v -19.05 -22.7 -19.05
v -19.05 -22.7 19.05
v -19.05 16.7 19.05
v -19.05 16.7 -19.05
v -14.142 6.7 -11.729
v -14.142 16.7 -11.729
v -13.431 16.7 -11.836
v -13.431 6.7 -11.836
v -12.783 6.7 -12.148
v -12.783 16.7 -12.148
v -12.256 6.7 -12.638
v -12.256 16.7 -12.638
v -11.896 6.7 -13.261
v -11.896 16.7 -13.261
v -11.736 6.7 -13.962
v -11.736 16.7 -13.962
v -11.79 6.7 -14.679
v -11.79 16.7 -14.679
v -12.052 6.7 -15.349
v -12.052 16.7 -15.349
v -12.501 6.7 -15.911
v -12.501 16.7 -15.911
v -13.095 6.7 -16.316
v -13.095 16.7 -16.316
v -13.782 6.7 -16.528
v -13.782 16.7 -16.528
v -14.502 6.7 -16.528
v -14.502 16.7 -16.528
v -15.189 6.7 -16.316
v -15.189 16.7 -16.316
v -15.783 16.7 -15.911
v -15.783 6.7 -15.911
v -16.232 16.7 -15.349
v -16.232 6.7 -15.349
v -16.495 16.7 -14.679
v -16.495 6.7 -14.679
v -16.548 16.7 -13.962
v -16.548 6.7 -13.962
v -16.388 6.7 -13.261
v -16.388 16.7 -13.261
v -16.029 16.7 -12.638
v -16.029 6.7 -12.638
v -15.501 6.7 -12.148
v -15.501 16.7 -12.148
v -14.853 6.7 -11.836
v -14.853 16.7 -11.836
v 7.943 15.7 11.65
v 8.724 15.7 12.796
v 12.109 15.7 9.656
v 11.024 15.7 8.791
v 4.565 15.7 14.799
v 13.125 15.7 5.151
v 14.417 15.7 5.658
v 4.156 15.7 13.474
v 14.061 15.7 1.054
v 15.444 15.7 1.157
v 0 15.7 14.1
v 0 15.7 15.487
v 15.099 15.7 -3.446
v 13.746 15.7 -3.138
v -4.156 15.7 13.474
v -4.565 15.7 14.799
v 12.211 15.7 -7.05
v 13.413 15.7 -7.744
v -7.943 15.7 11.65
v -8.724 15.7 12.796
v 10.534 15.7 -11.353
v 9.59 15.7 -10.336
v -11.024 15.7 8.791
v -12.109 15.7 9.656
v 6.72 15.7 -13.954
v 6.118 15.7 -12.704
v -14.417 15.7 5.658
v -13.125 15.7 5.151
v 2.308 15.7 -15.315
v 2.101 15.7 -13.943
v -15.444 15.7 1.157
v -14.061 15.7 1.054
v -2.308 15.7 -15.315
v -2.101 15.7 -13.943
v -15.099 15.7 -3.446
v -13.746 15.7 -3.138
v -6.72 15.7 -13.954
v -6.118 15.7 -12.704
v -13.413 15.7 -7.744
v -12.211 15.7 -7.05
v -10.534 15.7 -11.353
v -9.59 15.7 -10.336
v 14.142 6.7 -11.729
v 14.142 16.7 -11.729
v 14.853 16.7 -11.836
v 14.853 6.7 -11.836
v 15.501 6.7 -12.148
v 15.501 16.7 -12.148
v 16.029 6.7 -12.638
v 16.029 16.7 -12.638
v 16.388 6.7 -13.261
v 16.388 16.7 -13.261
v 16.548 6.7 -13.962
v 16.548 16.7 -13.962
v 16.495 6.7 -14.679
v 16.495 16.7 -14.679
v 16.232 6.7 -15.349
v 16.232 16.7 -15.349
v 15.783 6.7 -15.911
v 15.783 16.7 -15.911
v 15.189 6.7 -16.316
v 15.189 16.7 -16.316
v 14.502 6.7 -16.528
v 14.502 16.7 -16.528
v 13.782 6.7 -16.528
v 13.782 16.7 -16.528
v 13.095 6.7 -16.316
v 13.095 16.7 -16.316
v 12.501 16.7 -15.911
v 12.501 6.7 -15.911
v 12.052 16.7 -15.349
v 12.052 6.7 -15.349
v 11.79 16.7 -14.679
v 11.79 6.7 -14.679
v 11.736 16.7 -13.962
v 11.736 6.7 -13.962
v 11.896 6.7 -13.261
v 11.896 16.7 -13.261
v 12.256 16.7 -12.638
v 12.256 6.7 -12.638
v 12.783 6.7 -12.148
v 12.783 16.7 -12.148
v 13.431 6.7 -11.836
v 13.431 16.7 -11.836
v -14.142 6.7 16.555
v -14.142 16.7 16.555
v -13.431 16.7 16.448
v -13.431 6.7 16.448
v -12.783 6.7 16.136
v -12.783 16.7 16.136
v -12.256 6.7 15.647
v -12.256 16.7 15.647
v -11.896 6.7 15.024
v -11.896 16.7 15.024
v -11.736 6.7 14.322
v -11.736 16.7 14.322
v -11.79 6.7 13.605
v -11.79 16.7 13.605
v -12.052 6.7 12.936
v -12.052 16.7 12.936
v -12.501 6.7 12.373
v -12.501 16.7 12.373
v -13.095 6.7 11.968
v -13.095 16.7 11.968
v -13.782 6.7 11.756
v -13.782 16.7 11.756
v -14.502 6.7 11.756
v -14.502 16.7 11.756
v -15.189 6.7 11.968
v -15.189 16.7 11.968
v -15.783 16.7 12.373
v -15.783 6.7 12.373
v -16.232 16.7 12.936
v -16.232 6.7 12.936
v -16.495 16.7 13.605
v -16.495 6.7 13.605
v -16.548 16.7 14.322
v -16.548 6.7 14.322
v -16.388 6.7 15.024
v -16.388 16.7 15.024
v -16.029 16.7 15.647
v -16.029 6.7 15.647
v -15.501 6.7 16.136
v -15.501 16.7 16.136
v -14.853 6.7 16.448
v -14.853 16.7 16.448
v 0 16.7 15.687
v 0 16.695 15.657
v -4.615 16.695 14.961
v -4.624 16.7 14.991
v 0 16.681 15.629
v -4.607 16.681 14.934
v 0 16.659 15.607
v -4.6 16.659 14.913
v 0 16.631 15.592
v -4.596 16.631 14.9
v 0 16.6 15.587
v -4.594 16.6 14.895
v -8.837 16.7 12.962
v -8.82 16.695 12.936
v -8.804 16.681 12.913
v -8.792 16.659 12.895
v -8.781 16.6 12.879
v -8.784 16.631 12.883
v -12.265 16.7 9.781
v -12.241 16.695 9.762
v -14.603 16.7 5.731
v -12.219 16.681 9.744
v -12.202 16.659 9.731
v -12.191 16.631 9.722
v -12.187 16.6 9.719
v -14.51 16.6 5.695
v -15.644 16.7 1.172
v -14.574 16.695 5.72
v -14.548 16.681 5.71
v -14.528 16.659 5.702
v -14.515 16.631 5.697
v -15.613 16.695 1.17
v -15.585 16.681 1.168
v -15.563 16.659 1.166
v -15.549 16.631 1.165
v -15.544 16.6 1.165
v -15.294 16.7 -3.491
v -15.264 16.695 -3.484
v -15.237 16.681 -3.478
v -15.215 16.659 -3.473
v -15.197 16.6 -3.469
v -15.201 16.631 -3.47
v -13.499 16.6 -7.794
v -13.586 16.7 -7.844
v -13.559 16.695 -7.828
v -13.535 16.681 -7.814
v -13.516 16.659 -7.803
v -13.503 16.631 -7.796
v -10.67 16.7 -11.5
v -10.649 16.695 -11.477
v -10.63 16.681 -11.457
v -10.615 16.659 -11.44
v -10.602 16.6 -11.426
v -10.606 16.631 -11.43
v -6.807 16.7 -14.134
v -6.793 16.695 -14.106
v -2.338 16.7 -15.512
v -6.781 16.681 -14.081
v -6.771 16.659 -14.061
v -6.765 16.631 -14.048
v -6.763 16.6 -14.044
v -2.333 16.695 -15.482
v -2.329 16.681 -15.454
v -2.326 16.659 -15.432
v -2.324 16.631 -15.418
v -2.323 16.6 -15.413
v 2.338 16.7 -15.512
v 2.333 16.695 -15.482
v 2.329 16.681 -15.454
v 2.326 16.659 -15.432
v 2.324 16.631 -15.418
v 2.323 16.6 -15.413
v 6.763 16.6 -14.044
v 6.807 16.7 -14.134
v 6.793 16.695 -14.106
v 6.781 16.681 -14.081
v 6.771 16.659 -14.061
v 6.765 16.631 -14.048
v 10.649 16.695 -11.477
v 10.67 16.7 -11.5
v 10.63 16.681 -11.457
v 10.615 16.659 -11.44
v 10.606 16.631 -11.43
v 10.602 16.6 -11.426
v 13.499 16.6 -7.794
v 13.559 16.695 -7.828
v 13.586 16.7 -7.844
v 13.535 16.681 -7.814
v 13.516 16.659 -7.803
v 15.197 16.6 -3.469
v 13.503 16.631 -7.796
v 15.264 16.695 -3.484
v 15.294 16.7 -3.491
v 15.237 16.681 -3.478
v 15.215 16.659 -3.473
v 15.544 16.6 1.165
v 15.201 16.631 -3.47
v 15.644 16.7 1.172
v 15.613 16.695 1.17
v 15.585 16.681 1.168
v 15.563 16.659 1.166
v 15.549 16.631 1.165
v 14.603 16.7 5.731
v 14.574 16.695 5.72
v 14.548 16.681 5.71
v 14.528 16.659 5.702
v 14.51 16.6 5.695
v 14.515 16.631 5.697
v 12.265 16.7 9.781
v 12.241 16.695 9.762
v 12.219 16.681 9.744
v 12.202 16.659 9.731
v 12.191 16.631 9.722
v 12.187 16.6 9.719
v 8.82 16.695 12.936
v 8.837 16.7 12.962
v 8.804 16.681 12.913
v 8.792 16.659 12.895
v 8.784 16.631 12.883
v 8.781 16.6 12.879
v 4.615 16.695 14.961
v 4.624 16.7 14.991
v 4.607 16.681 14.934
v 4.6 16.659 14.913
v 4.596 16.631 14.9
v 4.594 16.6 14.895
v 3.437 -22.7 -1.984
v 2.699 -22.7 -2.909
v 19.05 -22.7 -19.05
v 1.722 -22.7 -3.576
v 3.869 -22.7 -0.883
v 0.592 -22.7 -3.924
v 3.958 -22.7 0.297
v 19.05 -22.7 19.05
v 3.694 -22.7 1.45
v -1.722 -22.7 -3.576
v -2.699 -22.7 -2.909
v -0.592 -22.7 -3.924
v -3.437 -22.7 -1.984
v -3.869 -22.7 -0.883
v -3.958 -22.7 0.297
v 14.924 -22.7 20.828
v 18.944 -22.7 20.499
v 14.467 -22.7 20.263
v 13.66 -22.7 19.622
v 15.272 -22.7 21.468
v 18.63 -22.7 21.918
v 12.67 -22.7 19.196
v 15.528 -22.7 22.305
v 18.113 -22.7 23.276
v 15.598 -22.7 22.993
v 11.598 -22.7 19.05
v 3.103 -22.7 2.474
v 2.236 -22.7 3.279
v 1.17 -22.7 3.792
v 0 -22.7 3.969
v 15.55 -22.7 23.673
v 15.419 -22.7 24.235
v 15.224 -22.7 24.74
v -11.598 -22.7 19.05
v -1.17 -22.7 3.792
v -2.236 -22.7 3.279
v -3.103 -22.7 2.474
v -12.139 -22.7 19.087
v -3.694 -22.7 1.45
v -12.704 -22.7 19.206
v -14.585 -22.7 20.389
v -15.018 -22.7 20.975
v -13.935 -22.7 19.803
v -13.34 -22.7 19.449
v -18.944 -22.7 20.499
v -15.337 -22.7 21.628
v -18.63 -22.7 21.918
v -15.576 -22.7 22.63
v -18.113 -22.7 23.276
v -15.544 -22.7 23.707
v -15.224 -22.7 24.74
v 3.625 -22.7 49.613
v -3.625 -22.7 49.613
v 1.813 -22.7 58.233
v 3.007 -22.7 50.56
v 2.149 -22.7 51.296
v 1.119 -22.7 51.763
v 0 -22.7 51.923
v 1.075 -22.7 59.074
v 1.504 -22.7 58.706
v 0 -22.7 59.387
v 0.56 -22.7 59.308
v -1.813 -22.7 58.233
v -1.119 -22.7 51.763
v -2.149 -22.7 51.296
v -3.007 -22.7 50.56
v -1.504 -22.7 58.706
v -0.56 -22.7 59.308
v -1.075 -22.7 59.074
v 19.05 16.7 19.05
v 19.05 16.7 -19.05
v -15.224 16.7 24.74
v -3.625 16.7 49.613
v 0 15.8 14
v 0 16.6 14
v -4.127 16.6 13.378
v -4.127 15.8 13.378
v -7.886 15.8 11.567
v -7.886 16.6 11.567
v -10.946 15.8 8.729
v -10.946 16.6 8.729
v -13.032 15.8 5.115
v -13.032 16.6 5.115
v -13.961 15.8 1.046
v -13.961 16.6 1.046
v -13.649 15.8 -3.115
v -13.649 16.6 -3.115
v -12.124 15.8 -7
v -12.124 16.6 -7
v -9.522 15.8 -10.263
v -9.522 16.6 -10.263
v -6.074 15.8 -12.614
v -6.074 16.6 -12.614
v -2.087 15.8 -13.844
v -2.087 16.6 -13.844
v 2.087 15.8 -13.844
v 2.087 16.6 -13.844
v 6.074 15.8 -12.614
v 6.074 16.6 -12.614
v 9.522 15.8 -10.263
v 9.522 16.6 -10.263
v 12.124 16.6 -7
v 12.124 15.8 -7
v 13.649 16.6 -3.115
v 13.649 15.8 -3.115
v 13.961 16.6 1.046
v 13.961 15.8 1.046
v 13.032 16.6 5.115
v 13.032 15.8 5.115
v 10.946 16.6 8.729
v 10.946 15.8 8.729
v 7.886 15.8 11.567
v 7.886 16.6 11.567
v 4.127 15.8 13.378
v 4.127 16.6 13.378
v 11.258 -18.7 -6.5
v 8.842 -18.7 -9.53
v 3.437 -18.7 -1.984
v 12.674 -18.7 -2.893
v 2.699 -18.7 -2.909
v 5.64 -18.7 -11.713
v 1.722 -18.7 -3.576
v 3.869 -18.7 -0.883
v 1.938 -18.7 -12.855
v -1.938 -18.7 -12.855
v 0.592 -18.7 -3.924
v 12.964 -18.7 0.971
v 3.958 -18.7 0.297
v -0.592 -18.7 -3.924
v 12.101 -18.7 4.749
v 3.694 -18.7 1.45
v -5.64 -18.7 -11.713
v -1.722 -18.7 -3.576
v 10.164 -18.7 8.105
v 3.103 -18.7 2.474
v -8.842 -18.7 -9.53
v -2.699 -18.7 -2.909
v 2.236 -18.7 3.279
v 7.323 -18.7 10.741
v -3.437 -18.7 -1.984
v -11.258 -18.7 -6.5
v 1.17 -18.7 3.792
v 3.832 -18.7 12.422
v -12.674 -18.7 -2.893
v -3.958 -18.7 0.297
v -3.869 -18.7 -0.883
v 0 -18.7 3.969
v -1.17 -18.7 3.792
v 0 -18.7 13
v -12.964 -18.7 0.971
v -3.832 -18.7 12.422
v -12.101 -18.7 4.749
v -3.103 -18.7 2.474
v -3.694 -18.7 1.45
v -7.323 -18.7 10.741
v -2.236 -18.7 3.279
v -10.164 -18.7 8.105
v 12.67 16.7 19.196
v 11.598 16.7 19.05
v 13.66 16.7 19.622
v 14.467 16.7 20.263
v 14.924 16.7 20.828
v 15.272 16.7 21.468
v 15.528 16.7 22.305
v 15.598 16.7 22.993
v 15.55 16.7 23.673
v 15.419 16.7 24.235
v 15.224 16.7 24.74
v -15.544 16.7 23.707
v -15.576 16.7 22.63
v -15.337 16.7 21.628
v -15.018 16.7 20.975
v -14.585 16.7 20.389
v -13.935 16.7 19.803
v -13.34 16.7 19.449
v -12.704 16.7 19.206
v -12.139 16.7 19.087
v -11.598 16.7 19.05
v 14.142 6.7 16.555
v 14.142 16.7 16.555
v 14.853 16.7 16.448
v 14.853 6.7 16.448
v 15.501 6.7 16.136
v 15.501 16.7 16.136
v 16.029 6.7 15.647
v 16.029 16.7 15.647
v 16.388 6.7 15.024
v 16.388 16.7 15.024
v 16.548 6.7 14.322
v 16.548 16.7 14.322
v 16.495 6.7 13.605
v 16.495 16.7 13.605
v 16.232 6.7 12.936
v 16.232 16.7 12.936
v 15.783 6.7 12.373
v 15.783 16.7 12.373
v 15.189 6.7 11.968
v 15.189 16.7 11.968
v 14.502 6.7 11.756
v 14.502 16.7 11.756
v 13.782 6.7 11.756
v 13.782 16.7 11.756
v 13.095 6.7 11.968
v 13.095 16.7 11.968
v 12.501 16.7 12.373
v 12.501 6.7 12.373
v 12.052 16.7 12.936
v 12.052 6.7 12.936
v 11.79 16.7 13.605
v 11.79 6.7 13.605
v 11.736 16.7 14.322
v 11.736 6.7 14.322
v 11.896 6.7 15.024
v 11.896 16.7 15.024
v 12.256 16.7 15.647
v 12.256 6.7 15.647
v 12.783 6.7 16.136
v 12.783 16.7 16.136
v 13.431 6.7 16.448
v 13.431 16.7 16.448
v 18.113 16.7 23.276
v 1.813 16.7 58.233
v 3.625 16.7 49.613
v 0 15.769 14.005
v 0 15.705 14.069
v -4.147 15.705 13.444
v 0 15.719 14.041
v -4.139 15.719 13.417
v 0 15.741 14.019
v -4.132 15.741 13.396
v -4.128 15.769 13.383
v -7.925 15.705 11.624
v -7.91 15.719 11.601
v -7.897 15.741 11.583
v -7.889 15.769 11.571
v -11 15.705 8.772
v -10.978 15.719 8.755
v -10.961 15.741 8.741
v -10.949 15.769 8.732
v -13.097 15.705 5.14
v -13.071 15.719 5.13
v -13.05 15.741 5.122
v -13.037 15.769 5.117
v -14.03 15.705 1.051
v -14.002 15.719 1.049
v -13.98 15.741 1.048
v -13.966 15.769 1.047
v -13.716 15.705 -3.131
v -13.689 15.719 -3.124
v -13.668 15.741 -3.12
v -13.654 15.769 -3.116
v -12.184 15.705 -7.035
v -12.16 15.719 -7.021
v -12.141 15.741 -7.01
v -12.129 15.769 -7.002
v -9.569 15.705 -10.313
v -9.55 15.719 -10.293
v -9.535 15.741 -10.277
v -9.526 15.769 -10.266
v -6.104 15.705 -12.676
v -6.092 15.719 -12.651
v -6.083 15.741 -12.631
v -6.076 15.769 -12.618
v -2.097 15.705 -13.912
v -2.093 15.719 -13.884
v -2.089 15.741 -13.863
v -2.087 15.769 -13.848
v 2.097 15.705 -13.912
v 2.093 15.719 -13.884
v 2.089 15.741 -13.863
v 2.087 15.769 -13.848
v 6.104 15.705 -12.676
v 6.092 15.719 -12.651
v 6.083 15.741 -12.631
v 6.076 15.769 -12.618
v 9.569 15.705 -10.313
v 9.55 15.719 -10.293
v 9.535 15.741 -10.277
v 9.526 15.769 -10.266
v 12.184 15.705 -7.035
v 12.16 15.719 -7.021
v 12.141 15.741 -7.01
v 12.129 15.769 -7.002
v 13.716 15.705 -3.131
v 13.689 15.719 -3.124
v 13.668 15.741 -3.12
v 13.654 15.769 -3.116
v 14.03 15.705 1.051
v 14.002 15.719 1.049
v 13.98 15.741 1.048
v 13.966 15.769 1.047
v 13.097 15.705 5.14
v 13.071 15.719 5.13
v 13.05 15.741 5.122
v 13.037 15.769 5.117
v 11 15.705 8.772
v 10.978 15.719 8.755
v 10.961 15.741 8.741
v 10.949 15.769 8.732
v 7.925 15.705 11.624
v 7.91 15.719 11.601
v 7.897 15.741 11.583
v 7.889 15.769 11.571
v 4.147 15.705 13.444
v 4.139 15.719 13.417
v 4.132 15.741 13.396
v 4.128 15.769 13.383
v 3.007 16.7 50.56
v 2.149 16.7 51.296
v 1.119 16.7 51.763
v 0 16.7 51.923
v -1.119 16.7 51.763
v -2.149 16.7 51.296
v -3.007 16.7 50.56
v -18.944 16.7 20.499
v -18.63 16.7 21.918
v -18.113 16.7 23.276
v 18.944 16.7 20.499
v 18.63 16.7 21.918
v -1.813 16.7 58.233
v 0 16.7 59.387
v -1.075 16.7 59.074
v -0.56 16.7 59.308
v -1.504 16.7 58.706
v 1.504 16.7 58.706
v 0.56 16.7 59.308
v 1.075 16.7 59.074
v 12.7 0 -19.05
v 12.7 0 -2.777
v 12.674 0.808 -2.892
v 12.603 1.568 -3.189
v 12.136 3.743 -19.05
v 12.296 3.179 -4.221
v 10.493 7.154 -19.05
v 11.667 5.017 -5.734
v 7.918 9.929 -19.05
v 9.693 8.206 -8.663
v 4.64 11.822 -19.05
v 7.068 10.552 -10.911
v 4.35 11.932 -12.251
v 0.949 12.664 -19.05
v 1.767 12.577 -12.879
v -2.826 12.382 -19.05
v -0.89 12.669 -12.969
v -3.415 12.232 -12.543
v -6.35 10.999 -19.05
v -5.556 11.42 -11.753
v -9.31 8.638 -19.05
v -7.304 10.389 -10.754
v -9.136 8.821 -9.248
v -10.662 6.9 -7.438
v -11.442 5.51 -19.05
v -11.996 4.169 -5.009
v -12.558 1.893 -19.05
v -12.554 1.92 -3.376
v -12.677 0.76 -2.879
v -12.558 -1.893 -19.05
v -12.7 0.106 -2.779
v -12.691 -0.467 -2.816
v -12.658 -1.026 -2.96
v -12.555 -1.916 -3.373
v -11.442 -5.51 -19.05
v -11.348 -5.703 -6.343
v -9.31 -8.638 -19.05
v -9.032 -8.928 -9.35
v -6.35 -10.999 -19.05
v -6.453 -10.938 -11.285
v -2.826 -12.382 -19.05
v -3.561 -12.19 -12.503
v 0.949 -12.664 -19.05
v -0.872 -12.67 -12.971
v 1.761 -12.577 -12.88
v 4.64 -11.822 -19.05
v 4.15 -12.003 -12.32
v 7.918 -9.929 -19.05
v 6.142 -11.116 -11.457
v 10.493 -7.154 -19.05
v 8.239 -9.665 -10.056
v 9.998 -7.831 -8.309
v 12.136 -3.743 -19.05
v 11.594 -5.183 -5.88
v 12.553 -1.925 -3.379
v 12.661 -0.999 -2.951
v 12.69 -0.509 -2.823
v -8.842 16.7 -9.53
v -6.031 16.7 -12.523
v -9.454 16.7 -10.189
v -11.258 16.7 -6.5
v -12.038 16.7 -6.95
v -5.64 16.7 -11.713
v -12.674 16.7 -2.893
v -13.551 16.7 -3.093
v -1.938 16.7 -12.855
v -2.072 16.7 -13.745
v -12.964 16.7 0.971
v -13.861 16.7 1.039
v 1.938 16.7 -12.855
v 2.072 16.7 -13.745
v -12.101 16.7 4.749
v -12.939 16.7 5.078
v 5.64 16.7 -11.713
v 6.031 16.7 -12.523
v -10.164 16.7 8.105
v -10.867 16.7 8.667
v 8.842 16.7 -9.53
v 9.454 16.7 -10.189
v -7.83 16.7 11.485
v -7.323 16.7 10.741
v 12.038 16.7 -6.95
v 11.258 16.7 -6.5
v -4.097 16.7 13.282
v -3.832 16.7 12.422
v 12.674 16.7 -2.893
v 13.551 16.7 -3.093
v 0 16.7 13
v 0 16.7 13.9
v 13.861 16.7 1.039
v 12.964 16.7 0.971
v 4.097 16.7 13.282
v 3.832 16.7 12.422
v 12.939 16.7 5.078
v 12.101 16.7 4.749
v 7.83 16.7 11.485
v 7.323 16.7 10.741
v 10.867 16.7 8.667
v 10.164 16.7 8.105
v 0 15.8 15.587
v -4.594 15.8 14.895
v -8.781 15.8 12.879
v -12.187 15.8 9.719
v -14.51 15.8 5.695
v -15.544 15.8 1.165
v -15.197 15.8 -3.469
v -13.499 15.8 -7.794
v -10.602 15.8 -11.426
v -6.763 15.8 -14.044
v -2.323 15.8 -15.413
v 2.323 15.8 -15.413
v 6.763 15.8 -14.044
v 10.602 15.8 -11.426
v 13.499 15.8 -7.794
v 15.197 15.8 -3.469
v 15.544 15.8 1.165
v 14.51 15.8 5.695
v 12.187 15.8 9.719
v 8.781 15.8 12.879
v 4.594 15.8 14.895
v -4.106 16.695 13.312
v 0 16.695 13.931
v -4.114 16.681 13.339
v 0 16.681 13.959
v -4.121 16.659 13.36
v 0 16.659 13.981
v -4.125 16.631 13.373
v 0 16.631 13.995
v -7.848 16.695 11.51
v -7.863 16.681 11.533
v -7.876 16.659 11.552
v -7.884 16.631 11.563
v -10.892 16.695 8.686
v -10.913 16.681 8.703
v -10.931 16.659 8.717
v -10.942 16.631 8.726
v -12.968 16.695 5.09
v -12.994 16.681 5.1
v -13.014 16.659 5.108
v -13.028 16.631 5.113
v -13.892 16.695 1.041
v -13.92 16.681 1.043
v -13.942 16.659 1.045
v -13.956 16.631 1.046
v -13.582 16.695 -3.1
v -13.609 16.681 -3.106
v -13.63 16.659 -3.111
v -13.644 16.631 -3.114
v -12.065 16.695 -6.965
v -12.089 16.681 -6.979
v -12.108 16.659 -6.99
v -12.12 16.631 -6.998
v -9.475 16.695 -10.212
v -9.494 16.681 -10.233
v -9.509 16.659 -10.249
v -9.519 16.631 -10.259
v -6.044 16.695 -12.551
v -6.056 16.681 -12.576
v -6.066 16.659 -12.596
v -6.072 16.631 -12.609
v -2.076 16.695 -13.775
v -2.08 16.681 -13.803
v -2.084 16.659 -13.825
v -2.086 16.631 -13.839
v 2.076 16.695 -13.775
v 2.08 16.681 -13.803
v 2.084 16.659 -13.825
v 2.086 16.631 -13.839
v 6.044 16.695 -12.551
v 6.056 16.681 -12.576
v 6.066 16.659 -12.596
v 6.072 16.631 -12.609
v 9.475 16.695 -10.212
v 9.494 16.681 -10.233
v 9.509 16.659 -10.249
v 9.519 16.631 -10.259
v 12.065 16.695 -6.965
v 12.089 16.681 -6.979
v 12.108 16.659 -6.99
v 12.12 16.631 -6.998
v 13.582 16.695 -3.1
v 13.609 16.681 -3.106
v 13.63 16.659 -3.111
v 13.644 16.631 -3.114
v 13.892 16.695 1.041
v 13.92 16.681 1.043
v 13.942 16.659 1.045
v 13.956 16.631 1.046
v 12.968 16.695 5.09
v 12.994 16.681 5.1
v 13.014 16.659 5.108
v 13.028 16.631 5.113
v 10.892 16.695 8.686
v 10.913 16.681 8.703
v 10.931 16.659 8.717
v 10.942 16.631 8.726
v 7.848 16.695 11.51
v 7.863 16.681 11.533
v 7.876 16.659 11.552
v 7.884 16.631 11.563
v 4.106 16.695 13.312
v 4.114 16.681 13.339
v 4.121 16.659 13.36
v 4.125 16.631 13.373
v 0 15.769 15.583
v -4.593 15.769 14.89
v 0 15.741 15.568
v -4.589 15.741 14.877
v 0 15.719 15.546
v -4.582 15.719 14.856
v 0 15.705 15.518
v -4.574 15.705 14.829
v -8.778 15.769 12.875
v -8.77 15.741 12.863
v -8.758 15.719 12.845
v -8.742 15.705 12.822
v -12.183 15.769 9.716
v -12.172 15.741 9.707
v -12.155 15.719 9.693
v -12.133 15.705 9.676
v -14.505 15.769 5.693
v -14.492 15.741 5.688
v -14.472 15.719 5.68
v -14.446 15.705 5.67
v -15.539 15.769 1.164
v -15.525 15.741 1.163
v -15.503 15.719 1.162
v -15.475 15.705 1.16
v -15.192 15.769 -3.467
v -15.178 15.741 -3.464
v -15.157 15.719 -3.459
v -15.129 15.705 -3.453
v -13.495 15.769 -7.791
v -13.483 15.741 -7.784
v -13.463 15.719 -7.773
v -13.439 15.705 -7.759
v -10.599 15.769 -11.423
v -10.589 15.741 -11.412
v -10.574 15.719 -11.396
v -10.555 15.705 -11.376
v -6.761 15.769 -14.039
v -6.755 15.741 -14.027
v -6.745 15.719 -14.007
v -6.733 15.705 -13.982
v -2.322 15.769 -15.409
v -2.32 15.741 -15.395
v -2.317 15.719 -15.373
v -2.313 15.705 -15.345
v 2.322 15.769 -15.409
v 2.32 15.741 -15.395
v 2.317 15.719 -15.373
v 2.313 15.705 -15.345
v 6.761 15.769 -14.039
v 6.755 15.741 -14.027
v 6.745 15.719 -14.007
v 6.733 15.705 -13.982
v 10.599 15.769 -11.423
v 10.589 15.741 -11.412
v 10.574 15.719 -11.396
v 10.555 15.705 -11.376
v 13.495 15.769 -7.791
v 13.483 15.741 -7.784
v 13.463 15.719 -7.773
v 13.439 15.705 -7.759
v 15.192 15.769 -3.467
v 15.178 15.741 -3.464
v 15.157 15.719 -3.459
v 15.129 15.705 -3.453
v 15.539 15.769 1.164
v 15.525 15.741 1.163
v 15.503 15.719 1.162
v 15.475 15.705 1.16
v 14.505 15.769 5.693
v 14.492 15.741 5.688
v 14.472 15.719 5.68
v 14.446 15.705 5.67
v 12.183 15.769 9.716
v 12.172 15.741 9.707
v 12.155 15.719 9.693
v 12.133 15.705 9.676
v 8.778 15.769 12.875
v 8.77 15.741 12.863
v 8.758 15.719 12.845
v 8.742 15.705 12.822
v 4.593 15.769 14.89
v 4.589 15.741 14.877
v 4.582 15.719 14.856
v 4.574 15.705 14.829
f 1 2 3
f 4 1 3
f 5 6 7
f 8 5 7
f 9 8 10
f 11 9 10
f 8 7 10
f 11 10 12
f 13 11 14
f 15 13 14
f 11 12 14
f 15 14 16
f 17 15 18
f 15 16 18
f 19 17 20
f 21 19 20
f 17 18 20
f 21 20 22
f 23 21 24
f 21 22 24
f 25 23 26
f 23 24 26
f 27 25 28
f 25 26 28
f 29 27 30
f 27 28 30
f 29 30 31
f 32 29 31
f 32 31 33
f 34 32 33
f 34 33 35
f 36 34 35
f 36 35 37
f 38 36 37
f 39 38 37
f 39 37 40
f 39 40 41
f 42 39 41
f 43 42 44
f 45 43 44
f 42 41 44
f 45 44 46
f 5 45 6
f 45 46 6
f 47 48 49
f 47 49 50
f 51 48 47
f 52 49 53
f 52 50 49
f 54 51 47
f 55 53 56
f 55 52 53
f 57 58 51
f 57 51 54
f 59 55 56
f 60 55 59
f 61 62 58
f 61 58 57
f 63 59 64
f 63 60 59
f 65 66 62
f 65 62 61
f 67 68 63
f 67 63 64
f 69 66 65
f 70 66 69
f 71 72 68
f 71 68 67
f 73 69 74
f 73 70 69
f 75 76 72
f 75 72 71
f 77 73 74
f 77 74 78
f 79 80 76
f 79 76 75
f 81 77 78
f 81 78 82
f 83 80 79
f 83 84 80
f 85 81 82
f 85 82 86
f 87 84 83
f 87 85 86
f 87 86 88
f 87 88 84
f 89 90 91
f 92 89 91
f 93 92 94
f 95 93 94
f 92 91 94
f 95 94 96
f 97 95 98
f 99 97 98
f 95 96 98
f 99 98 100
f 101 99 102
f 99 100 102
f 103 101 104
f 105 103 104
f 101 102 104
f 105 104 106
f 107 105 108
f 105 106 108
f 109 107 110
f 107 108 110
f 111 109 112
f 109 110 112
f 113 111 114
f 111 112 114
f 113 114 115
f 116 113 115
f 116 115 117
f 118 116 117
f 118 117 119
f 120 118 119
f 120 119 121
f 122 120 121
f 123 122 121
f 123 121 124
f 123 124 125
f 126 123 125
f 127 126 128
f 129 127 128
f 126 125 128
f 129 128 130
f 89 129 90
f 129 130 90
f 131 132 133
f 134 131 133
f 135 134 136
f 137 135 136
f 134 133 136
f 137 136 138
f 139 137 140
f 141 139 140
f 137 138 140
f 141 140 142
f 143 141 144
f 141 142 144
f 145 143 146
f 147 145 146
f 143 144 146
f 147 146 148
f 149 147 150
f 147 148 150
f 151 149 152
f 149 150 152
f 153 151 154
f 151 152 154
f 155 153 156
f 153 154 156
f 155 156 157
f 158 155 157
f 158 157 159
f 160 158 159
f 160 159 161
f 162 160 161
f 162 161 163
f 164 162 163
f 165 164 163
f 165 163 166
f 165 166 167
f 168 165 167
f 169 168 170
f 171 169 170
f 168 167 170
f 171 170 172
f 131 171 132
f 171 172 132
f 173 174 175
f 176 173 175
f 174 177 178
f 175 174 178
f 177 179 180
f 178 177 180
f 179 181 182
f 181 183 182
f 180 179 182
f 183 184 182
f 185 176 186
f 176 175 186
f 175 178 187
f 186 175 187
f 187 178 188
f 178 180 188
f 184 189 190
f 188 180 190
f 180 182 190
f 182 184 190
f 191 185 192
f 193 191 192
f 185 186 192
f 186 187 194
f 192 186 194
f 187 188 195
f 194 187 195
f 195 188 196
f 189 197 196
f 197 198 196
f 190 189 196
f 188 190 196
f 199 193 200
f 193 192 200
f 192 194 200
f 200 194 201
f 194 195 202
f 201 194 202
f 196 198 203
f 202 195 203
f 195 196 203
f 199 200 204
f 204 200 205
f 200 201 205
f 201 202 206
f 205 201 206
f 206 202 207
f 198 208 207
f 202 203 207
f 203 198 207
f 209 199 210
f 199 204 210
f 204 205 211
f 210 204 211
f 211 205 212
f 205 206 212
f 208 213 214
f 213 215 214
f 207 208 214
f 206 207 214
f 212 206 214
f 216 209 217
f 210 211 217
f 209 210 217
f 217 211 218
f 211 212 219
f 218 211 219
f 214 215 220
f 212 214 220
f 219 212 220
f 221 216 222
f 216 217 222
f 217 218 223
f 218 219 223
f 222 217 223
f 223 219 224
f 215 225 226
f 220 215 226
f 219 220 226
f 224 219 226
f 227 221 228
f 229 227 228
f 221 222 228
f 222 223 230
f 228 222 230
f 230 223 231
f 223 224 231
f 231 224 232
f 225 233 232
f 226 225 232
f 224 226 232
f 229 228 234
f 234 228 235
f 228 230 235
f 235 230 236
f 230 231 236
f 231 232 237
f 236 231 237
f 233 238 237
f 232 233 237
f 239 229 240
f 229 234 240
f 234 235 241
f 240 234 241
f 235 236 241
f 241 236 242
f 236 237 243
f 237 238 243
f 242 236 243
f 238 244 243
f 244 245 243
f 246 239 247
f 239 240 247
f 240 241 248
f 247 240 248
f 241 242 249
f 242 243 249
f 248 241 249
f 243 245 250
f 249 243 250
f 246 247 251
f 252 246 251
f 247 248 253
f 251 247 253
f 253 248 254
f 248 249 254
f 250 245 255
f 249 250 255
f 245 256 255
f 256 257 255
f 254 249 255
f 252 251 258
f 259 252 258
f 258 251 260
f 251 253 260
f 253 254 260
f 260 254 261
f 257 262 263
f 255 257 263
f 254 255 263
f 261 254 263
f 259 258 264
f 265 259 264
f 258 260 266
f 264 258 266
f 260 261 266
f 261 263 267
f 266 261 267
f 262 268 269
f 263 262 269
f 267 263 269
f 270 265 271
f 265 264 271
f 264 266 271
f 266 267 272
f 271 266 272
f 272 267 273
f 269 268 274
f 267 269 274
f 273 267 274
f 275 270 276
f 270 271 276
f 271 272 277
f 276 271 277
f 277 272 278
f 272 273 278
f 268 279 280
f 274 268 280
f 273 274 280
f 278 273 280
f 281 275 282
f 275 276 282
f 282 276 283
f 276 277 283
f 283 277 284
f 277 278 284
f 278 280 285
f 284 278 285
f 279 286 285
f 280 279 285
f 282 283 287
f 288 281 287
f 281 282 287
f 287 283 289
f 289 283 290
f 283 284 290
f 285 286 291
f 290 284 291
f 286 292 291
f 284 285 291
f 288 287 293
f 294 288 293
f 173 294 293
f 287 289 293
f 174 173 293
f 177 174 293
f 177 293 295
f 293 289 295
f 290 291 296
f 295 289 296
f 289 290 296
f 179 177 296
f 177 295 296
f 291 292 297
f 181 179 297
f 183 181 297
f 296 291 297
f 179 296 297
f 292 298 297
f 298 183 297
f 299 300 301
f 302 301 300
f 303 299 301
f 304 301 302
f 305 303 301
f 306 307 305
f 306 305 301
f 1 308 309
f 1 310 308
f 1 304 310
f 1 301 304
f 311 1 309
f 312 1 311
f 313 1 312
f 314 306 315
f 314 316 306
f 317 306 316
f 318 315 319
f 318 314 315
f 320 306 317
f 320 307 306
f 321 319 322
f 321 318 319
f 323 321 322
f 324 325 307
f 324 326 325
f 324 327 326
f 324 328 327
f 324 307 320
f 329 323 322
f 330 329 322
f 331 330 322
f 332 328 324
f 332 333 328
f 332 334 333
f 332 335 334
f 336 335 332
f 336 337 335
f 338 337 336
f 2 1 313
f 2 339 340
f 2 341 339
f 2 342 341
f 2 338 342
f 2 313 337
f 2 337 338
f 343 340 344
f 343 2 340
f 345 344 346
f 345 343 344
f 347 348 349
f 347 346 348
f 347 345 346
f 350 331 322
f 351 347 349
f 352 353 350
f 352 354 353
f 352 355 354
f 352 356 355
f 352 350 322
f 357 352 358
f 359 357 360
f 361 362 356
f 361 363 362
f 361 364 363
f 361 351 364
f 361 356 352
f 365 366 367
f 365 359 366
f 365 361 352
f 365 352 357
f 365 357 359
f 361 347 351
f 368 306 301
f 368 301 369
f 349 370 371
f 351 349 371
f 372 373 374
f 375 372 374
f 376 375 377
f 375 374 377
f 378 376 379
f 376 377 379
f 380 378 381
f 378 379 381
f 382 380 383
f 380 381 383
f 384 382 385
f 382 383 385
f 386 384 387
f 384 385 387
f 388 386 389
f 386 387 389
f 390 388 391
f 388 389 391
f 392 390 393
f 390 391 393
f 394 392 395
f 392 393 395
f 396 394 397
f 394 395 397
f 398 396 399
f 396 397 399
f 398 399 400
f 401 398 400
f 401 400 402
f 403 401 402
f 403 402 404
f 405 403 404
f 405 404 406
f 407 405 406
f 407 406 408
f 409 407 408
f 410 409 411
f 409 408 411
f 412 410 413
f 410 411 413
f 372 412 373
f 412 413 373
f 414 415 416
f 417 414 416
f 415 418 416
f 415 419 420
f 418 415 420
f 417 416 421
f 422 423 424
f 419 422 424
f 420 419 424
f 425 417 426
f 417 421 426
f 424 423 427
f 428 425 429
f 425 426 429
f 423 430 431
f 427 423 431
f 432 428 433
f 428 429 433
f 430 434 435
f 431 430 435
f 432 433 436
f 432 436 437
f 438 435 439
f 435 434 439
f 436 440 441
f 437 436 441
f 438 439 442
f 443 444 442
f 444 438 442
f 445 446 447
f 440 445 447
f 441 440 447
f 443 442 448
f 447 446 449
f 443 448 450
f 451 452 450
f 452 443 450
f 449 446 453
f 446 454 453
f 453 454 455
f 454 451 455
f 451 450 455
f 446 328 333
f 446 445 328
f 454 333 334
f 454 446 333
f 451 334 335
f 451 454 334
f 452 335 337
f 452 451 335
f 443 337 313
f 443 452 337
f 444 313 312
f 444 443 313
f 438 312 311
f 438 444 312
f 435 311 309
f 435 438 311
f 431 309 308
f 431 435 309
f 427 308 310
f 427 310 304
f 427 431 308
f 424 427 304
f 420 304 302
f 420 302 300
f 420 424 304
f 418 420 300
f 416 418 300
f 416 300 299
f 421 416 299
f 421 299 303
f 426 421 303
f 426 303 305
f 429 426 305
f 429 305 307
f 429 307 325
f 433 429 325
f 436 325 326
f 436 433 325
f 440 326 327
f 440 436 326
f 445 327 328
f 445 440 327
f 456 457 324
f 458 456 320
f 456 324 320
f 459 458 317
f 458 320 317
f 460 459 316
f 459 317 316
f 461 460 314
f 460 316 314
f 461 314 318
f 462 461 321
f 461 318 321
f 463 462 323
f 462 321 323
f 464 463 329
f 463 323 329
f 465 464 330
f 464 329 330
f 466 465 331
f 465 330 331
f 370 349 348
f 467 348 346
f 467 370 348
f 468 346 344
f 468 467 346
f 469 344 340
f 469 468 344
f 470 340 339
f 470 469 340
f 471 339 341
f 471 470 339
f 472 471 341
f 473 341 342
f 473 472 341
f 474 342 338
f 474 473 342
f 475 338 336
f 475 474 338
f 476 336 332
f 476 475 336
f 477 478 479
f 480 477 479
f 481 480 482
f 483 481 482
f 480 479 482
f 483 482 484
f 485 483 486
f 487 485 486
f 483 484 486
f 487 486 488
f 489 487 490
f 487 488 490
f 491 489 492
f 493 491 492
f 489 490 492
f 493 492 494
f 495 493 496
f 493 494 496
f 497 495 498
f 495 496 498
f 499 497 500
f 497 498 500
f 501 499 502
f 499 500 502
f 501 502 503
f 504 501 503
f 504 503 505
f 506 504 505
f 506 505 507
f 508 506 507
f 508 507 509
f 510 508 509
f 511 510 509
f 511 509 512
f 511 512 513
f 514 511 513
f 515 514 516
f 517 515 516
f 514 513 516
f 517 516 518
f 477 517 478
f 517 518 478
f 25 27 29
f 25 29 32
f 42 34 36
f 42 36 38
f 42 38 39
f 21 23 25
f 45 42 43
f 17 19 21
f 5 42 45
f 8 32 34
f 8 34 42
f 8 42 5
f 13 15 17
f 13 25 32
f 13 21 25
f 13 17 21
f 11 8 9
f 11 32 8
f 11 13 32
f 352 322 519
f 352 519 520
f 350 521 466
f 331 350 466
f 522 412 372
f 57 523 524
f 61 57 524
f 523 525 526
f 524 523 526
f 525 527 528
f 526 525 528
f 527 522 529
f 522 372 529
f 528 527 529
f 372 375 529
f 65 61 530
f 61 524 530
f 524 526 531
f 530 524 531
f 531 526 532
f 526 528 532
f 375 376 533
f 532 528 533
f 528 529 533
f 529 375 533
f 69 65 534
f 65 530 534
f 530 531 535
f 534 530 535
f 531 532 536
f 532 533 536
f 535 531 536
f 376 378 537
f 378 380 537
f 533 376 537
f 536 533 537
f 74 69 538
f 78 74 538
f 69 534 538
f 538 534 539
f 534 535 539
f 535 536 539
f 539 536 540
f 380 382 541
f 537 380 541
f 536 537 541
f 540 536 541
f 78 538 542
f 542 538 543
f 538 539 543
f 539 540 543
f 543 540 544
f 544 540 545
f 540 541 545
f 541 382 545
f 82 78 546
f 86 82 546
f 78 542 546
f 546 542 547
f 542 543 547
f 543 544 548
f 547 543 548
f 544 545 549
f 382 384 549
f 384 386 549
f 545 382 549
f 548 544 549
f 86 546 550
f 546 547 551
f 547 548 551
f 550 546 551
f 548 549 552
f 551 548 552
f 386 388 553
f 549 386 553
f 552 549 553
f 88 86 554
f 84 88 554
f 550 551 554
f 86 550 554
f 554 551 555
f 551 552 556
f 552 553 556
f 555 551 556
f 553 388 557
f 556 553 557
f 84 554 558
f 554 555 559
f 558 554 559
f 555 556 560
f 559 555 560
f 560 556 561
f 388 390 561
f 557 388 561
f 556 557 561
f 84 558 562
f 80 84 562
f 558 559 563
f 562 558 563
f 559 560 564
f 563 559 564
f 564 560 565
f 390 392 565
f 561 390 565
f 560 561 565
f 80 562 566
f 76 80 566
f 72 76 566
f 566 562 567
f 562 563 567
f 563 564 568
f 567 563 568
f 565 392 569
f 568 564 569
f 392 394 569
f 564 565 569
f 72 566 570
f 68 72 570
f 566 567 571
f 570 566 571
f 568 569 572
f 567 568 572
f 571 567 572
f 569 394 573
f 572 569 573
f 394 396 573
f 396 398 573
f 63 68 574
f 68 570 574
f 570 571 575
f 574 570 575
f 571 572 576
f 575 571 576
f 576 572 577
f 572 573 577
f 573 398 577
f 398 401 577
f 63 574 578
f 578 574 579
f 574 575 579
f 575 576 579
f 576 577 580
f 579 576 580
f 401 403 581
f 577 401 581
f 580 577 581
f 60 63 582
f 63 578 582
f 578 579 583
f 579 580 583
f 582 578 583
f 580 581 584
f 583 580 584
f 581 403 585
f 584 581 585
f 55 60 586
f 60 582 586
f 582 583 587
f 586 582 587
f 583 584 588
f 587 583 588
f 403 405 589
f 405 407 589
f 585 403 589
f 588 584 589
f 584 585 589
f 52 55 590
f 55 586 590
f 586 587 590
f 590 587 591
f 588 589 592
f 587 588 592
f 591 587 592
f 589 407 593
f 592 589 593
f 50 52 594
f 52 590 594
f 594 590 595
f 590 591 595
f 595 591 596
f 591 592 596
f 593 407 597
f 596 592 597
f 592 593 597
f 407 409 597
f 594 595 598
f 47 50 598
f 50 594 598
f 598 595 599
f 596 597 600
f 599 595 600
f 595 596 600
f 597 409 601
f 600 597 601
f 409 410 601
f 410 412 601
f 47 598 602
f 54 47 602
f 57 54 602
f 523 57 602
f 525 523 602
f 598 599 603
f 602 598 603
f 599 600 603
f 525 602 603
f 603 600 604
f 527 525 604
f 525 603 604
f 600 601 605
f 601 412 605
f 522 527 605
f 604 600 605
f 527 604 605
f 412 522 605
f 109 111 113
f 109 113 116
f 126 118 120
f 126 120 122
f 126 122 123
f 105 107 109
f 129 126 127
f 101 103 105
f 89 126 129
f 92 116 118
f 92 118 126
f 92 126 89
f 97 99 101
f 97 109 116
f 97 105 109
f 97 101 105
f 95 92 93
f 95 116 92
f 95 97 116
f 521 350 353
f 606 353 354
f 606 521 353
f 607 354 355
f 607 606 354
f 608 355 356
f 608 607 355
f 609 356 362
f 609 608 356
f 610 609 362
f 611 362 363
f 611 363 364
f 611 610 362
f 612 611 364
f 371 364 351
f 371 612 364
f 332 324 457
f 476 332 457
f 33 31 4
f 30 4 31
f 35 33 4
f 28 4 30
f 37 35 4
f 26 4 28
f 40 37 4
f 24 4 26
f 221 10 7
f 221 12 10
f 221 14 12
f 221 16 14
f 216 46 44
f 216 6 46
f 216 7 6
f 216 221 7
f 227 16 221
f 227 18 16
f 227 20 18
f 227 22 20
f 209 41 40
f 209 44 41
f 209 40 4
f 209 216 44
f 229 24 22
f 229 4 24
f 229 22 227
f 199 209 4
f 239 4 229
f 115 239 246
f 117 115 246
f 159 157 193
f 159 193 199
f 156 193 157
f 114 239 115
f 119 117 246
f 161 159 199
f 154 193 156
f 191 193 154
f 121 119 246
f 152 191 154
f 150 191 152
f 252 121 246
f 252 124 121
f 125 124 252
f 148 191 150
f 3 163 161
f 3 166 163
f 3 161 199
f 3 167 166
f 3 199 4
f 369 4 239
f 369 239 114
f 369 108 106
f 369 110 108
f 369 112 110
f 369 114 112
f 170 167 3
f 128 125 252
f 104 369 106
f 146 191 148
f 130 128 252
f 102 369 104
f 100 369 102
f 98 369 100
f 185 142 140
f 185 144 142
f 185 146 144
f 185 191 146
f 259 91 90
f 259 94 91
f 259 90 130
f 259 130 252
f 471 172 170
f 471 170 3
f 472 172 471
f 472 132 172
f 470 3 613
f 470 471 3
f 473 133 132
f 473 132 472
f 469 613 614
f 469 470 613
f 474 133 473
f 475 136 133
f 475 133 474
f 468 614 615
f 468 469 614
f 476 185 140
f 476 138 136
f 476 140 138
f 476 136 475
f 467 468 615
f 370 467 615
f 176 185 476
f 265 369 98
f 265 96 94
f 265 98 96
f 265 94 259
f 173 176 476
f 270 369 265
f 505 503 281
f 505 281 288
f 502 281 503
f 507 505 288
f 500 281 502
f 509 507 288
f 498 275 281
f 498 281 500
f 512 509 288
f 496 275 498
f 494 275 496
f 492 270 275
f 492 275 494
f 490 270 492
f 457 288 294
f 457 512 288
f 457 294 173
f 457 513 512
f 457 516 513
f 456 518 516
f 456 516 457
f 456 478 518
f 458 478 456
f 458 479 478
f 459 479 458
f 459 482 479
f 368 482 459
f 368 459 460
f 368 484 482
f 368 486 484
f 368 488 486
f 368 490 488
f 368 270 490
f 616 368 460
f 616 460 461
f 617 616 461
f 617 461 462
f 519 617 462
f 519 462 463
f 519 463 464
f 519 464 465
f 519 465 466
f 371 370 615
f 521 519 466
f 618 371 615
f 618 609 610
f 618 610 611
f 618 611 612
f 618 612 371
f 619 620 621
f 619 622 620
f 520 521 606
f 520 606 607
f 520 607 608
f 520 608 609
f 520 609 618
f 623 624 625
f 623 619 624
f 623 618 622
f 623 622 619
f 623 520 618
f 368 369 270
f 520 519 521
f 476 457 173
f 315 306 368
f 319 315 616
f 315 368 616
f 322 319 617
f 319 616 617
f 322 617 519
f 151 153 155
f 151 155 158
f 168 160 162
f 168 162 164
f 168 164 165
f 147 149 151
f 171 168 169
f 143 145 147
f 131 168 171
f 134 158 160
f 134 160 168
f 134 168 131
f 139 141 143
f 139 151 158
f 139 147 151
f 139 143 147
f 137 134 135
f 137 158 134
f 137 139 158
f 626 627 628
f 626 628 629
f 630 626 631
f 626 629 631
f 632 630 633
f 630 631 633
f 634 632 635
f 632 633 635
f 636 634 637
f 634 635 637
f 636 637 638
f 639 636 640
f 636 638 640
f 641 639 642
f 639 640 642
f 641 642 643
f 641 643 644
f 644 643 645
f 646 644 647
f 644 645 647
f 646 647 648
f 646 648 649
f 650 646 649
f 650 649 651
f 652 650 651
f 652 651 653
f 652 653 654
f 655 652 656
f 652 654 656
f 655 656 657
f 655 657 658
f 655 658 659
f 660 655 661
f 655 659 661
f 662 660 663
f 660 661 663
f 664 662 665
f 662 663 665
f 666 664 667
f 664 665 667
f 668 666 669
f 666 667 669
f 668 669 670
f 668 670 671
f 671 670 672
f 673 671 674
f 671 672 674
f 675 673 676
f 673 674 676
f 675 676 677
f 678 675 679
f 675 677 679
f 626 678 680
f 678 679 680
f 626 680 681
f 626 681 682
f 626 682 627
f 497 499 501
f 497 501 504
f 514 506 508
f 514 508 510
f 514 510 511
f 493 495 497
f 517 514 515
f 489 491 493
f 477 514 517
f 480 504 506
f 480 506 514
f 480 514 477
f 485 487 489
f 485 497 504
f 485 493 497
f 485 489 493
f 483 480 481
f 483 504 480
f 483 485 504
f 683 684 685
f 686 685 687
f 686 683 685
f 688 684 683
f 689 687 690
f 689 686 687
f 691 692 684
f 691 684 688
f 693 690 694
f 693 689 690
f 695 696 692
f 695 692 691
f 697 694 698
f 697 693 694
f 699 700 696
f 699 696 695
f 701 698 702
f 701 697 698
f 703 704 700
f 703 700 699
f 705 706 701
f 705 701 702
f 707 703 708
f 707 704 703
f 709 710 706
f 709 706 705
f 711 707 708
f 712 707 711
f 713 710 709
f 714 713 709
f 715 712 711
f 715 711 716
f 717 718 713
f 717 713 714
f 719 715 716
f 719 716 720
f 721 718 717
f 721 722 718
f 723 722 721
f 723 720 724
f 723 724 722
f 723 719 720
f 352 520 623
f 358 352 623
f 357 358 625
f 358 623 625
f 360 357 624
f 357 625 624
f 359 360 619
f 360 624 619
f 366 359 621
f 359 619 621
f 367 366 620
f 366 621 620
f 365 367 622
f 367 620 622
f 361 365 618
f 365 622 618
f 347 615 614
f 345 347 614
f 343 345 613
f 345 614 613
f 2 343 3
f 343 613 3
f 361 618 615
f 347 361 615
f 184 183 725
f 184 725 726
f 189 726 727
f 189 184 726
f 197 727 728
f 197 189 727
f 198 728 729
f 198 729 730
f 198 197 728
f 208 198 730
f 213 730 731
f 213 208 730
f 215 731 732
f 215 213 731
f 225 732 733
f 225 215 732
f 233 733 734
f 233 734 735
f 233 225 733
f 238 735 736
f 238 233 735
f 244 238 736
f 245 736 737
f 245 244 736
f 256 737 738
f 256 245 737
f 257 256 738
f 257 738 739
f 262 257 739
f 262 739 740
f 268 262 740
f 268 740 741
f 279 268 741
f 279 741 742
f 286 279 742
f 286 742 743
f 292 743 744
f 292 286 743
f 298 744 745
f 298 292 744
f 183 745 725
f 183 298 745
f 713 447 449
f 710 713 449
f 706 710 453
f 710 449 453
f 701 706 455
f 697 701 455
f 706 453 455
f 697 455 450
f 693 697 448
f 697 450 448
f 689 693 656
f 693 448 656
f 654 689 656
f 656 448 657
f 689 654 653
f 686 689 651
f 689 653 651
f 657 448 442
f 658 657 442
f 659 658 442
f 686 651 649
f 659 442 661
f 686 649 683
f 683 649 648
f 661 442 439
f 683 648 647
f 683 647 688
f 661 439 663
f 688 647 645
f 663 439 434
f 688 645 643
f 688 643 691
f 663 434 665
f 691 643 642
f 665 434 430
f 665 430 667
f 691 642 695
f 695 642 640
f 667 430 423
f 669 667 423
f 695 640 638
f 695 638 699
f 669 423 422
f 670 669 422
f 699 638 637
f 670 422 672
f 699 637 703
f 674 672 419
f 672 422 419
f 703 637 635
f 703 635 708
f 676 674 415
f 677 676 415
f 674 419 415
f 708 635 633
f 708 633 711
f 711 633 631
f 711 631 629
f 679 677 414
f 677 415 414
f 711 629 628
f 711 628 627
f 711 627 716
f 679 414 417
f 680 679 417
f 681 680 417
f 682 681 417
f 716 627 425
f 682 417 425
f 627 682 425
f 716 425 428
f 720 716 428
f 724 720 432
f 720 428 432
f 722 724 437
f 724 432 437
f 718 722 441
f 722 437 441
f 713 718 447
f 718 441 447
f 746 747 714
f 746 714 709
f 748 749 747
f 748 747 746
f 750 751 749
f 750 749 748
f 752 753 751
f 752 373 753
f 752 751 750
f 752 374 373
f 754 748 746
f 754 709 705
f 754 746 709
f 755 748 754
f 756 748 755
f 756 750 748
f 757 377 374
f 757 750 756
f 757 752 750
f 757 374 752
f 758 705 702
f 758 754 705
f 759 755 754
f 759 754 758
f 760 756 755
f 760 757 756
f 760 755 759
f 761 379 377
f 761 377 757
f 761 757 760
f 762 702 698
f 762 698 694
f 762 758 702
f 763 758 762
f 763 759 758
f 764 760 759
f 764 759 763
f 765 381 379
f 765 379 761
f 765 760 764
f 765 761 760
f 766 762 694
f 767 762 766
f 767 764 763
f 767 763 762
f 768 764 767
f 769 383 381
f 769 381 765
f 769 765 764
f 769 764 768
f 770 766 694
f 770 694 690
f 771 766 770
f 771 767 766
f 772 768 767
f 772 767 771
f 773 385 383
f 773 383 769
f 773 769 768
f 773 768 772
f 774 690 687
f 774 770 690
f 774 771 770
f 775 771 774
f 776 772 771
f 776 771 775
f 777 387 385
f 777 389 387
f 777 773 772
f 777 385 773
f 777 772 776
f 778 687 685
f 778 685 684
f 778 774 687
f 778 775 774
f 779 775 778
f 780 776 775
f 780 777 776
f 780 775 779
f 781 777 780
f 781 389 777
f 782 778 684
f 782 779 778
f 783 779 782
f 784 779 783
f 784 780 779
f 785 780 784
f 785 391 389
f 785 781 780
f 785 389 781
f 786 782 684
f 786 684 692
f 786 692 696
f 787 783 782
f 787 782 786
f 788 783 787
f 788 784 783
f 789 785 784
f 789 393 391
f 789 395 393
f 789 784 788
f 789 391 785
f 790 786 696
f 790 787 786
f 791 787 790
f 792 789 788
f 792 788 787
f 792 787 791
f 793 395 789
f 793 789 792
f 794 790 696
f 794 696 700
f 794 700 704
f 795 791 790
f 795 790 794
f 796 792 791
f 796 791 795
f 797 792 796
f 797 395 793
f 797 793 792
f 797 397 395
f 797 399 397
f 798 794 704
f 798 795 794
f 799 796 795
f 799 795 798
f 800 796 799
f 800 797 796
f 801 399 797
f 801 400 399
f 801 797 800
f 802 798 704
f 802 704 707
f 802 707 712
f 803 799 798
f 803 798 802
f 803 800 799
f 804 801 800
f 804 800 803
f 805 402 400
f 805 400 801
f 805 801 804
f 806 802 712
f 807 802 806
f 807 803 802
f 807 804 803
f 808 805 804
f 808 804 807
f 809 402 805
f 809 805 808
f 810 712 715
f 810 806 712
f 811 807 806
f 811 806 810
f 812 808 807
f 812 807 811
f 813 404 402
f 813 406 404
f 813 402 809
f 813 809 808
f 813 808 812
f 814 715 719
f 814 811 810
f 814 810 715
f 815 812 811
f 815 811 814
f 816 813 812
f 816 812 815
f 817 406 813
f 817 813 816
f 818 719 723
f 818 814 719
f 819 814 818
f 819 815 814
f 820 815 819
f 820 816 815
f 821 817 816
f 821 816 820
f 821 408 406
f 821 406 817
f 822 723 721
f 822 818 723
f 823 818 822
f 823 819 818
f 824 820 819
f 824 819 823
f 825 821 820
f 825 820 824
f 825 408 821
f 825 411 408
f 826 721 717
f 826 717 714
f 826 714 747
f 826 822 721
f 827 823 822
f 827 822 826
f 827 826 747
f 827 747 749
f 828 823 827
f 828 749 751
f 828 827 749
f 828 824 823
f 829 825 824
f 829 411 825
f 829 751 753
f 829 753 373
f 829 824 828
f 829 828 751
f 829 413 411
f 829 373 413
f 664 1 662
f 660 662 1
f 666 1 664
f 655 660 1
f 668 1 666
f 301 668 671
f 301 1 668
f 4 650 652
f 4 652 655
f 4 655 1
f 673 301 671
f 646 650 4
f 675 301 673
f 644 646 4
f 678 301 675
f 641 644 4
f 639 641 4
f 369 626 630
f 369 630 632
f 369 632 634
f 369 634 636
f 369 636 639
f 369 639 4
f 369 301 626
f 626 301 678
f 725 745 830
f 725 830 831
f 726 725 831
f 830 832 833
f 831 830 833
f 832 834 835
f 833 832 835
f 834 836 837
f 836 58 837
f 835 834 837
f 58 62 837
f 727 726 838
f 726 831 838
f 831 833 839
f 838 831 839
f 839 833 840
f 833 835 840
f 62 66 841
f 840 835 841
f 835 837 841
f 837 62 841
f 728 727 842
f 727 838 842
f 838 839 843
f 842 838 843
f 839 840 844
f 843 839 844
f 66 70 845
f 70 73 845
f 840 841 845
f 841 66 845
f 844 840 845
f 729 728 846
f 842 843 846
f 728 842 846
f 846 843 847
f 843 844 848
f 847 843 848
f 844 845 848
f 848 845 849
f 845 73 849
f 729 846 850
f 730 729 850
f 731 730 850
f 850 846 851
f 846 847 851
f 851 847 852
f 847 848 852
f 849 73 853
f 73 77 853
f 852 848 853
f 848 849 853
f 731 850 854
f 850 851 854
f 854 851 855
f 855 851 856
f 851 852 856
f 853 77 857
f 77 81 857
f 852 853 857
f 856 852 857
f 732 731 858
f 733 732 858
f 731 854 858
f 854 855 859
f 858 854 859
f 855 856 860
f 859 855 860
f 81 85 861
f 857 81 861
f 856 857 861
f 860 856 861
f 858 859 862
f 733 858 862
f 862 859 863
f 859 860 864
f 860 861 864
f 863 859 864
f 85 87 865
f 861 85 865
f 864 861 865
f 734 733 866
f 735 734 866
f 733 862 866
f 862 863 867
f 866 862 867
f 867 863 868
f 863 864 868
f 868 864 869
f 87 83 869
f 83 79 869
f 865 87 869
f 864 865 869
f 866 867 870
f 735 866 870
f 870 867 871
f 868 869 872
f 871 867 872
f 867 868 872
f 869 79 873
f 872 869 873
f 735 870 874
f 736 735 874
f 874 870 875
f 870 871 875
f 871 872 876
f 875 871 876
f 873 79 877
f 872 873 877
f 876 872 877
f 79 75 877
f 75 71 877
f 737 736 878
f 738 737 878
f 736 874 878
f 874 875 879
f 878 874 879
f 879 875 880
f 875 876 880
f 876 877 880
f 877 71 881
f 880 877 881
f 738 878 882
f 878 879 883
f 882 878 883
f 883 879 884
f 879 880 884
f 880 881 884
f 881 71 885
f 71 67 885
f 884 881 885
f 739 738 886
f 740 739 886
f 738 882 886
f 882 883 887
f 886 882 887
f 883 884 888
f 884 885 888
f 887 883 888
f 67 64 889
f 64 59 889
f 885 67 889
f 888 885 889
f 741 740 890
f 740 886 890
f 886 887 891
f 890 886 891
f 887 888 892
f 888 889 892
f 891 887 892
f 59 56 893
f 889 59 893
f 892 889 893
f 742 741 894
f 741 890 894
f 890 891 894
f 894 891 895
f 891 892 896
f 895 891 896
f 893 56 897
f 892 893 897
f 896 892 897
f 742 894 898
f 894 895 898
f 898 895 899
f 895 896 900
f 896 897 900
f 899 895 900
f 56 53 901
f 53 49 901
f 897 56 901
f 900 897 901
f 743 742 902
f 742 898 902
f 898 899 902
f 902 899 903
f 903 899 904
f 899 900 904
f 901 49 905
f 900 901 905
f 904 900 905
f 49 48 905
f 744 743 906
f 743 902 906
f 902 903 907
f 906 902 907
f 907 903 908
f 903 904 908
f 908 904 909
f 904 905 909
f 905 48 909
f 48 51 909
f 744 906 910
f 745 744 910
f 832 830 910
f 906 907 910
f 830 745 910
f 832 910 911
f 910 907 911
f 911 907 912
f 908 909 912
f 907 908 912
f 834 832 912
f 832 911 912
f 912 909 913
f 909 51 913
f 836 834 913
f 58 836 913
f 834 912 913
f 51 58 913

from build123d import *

# Parameters (mm, degrees)
SKETCH1_W                       = 39.4
SKETCH1_H                       = 38.1
BOSS_EXTRUDE1_DEPTH             = 19.05
SKETCH1_4_W                     = 12.7
SKETCH1_4_H                     = 19.05
SKETCH1_5_W                     = 1
SKETCH1_5_H                     = 1.5875
FILLET2_R                       = 0.1
SKETCH2_R                       = 2.413
CUT_EXTRUDE1_DEPTH              = 10
EXTRUDE_THIN1_REACH             = 37.229
EXTRUDE_THIN1_DIRECTION_2_REACH = 37.229
FILLET5_R                       = 4


with BuildPart() as part:
    # Sketch1 → Boss-Extrude1 (new, symmetric)
    with BuildSketch(Plane.YZ):
        with Locations((-3, 0)):
            Rectangle(SKETCH1_W, SKETCH1_H)
    extrude(amount=BOSS_EXTRUDE1_DEPTH, both=True)

    # Sketch1<3> → Cut-Revolve1 (revolve, cut)
    with BuildSketch(Plane.YZ):
        Polygon((16.7, 0), (16.7, 13), (-18.7, 13), (-18.7, 3.96875), (-22.7, 3.96875), (-22.7, 0), align=None)
    revolve(axis=Axis((0, 16.7, 0), (0, -1, 0)), mode=Mode.SUBTRACT)

    # Sketch1<4> → Cut-Revolve2 (revolve, cut)
    with BuildSketch(Plane.YZ):
        with Locations((6.35, -9.525)):
            Rectangle(SKETCH1_4_W, SKETCH1_4_H)
    revolve(axis=Axis((0, 0, 0), (0, 0, -1)), mode=Mode.SUBTRACT)

    # Sketch1<5> → Cut-Revolve3 (revolve, cut)
    with BuildSketch(Plane.YZ):
        with Locations((16.2, 14.79375)):
            Rectangle(SKETCH1_5_W, SKETCH1_5_H)
    revolve(axis=Axis((0, 16.7, 0), (0, -1, 0)), mode=Mode.SUBTRACT)

    # Fillet2
    fillet2_edges = [part.edges().sort_by_distance(p)[0] for p in [
        (0, 16.7, -15.5875),
        (0, 15.7, -15.5875),
        (0, 15.7, -14),
        (0, 16.7, -14),
    ]]
    fillet(fillet2_edges, radius=FILLET2_R)

    # Sketch2 → Cut-Extrude1 (cut)
    with BuildSketch(Plane(origin=(0, 16.7, 0), x_dir=(-1, 0, 0), z_dir=(0, 1, 0))):
        with Locations((-14.142135624, 14.142135624)):
            Circle(SKETCH2_R)
        with Locations((14.142135624, 14.142135624)):
            Circle(SKETCH2_R)
        with Locations((14.142135624, -14.142135624)):
            Circle(SKETCH2_R)
        with Locations((-14.142135624, -14.142135624)):
            Circle(SKETCH2_R)
    extrude(amount=-CUT_EXTRUDE1_DEPTH, mode=Mode.SUBTRACT)

    # Extrude-Thin1: up to this face of the body (flat: up to its plane)
    extrude_thin1_end = Plane(part.part.faces().sort_by_distance((-18.511184633, 16.7, 0))[0])
    # Sketch3 → Extrude-Thin1 (add, up to the picked face)
    with BuildSketch(Plane(origin=(0, 0, 0), x_dir=(-1, 0, 0), z_dir=(0, 1, 0)), mode=Mode.PRIVATE) as extrude_thin1_sk1:
        with BuildLine():
            ThreePointArc((-19.05, 19.05), (-18.812960071, 21.214396139), (-18.11307787, 23.276182617))
            Line((-18.11307787, 23.276182617), (-1.812615574, 58.232636819))
            ThreePointArc((-1.812615574, 58.232636819), (0, 59.387400296), (1.812615574, 58.232636819))
            Line((1.812615574, 58.232636819), (18.11307787, 23.276182617))
            ThreePointArc((18.11307787, 23.276182617), (18.812960071, 21.214396139), (19.05, 19.05))
            Line((19.05, 19.05), (17.05, 19.05))
            ThreePointArc((17.05, 19.05), (16.860368057, 20.781516912), (16.300462296, 22.430946094))
            Line((16.300462296, 22.430946094), (0, 57.387400296))
            Line((0, 57.387400296), (-16.300462296, 22.430946094))
            ThreePointArc((-16.300462296, 22.430946094), (-16.860368057, 20.781516912), (-17.05, 19.05))
            Line((-17.05, 19.05), (-19.05, 19.05))
        make_face()
    extrude_thin1_tool1 = split(extrude(extrude_thin1_sk1.sketch, amount=EXTRUDE_THIN1_REACH, mode=Mode.PRIVATE), bisect_by=extrude_thin1_end, keep=Keep.BOTH, mode=Mode.PRIVATE)
    add(extrude_thin1_tool1.solids().sort_by(Axis((18.271251, 0, 21.094302), (0, 1, 0)))[0])

    # Extrude-Thin1 direction 2: up to this face of the body (flat: up to its plane)
    extrude_thin1_direction_2_end = Plane(part.part.faces().sort_by_distance((0, -22.7, 18.511184633))[0])
    # Sketch3 → Extrude-Thin1 direction 2 (add, up to the picked face)
    with BuildSketch(Plane(origin=(0, 0, 0), x_dir=(-1, 0, 0), z_dir=(0, 1, 0)), mode=Mode.PRIVATE) as extrude_thin1_direction_2_sk1:
        with BuildLine():
            ThreePointArc((-19.05, 19.05), (-18.812960071, 21.214396139), (-18.11307787, 23.276182617))
            Line((-18.11307787, 23.276182617), (-1.812615574, 58.232636819))
            ThreePointArc((-1.812615574, 58.232636819), (0, 59.387400296), (1.812615574, 58.232636819))
            Line((1.812615574, 58.232636819), (18.11307787, 23.276182617))
            ThreePointArc((18.11307787, 23.276182617), (18.812960071, 21.214396139), (19.05, 19.05))
            Line((19.05, 19.05), (17.05, 19.05))
            ThreePointArc((17.05, 19.05), (16.860368057, 20.781516912), (16.300462296, 22.430946094))
            Line((16.300462296, 22.430946094), (0, 57.387400296))
            Line((0, 57.387400296), (-16.300462296, 22.430946094))
            ThreePointArc((-16.300462296, 22.430946094), (-16.860368057, 20.781516912), (-17.05, 19.05))
            Line((-17.05, 19.05), (-19.05, 19.05))
        make_face()
    extrude_thin1_direction_2_tool1 = split(extrude(extrude_thin1_direction_2_sk1.sketch, amount=-EXTRUDE_THIN1_DIRECTION_2_REACH, mode=Mode.PRIVATE), bisect_by=extrude_thin1_direction_2_end, keep=Keep.BOTH, mode=Mode.PRIVATE)
    add(extrude_thin1_direction_2_tool1.solids().sort_by(Axis((18.271251, 0, 21.094302), (0, -1, 0)))[0])

    # Fillet5
    fillet5_edges = [part.edges().sort_by_distance(p)[0] for p in [
        (0, -3, 57.387400296),
        (17.05, -3, 19.05),
        (-17.05, -3, 19.05),
    ]]
    fillet(fillet5_edges, radius=FILLET5_R)


solid = part.part
